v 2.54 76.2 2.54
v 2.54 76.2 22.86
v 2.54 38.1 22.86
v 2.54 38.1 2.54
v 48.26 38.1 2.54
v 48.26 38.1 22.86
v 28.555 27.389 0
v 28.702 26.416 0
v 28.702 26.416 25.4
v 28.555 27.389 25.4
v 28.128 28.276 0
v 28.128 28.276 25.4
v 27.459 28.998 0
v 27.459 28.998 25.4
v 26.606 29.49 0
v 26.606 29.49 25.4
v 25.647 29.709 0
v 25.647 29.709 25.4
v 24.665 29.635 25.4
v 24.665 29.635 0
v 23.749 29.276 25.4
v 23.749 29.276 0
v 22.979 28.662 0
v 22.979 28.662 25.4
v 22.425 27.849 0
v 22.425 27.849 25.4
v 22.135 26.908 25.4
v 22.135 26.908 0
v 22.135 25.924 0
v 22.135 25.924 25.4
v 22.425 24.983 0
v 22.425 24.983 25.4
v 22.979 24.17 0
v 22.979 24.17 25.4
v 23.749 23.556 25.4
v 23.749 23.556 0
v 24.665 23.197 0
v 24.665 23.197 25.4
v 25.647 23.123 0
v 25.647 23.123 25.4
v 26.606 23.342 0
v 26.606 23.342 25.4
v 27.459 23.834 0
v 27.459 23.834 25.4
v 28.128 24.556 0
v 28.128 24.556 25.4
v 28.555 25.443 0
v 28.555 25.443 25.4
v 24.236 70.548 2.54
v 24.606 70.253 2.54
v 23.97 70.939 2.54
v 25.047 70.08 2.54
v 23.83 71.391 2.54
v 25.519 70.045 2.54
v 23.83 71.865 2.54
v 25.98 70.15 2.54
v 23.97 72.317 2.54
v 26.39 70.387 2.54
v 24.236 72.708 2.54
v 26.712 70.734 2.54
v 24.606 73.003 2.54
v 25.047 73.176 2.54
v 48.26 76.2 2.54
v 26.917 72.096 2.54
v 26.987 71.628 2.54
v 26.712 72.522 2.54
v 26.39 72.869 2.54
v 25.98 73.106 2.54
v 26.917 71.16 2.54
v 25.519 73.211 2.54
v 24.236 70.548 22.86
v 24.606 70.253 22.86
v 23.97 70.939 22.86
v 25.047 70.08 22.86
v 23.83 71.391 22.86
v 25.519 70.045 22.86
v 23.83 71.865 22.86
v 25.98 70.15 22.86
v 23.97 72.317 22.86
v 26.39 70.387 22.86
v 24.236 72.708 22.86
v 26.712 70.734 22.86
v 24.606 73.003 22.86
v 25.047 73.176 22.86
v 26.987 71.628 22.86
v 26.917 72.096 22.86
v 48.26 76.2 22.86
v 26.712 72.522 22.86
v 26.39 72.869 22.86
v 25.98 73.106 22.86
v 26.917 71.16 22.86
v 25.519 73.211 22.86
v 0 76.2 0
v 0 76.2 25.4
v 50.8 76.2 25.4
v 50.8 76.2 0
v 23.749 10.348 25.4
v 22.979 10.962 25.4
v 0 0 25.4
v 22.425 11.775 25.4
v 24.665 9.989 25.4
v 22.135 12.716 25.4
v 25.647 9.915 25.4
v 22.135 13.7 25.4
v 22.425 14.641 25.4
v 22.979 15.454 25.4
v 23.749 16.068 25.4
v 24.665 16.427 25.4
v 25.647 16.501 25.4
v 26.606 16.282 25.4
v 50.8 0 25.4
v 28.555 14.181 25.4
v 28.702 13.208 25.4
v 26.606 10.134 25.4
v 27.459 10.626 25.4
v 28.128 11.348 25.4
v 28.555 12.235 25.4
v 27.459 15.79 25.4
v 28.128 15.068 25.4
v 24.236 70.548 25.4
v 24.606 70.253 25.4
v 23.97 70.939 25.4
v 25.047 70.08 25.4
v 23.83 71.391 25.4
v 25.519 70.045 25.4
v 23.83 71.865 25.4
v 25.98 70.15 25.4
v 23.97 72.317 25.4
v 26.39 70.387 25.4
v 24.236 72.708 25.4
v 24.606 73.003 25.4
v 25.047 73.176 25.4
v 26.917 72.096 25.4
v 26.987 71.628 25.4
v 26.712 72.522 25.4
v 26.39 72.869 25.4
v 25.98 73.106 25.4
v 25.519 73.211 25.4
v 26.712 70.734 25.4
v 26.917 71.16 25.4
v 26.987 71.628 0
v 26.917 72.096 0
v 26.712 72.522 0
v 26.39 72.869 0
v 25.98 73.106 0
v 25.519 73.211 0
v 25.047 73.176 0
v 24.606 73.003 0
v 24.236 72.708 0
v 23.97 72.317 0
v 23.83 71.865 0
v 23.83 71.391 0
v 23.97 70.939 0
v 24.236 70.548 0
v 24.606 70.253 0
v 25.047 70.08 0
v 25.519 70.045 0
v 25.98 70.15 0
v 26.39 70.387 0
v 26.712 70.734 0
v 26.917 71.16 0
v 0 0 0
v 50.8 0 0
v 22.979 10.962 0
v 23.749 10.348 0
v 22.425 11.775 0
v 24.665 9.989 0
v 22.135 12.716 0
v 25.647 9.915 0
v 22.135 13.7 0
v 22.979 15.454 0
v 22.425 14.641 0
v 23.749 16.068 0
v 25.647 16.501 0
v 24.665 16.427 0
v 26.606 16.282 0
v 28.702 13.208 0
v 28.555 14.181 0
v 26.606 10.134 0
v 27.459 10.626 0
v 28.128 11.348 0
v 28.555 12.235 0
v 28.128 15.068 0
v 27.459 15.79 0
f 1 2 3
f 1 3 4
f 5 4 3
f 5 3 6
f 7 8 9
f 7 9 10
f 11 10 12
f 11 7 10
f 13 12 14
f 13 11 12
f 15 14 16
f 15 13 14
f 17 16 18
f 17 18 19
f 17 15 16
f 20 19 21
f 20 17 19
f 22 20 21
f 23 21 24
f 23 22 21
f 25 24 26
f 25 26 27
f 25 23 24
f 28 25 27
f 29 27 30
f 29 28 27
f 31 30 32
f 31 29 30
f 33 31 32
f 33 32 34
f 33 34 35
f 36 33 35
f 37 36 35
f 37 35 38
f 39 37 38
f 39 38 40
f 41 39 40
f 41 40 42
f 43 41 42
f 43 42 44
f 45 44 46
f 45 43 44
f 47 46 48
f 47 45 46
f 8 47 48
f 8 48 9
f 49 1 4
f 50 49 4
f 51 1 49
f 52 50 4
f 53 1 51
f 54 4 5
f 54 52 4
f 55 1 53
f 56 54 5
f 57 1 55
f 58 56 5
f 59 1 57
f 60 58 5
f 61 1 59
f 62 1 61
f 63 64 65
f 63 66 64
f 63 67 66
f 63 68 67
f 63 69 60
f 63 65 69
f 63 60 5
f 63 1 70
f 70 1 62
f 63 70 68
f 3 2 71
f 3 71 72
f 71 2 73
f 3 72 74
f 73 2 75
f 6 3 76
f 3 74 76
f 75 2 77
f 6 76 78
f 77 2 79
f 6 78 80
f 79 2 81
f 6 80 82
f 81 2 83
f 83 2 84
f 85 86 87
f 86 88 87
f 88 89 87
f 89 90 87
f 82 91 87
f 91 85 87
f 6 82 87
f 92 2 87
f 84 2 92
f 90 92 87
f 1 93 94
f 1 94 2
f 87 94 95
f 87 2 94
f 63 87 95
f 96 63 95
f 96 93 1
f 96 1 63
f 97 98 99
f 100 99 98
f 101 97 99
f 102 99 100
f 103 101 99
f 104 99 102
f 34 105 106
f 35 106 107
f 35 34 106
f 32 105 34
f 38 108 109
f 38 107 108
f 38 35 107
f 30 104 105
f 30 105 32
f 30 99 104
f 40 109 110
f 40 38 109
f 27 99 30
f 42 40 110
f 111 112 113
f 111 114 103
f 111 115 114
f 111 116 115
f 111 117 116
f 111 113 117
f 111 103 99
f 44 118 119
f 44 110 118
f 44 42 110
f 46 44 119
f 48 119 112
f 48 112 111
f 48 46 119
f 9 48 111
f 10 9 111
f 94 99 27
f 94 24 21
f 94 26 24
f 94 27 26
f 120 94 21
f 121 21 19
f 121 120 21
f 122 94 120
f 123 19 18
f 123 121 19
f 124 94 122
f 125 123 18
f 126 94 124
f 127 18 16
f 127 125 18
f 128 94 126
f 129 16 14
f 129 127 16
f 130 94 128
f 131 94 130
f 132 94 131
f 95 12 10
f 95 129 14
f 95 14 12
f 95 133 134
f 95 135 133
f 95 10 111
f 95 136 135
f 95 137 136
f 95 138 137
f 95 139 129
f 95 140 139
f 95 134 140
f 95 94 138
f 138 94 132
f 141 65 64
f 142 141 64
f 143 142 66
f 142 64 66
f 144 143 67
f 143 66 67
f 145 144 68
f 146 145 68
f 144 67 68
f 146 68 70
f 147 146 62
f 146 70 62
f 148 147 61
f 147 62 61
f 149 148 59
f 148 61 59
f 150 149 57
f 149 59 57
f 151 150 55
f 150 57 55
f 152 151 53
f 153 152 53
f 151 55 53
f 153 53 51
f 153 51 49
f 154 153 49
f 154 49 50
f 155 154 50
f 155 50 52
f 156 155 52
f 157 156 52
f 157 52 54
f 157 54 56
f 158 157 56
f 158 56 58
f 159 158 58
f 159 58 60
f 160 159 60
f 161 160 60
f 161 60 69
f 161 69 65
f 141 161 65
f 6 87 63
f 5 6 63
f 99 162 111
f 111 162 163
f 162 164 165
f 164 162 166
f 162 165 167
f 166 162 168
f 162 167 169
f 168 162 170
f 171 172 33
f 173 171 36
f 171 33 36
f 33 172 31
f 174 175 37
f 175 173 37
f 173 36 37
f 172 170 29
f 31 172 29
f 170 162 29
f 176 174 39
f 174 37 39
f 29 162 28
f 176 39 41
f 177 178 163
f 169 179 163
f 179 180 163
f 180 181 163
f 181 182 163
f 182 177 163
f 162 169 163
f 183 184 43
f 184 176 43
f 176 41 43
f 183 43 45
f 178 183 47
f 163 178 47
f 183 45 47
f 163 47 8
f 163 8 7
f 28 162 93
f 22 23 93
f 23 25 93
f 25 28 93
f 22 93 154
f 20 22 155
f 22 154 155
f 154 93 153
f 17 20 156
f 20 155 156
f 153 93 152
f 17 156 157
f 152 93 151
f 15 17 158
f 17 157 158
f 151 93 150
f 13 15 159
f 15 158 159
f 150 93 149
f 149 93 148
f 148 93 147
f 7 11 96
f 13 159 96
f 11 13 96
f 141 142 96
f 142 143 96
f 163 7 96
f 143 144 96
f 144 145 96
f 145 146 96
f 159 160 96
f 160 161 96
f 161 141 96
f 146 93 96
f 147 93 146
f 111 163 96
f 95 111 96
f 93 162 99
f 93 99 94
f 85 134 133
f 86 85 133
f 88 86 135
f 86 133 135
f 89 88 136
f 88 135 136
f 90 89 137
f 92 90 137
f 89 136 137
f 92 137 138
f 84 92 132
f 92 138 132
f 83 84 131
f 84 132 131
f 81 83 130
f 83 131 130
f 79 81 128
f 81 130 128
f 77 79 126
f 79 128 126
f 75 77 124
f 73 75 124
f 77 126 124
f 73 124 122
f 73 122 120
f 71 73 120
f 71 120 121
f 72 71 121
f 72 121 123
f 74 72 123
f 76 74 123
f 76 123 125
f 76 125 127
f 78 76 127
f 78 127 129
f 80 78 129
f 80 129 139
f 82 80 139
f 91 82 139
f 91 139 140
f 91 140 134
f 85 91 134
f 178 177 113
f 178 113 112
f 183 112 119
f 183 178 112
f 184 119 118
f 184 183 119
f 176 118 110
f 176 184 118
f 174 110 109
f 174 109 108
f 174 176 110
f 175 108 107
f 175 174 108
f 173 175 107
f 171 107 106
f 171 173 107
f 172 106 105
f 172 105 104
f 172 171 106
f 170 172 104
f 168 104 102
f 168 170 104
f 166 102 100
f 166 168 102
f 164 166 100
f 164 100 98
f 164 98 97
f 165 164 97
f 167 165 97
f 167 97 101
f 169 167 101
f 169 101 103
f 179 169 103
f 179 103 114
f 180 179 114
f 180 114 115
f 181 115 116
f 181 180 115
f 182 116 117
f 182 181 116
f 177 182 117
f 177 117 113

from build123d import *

# Parameters (mm, degrees)
SKETCH1_W           = 50.8
SKETCH1_H           = 76.2
SKETCH1_R           = 3.302
BOSS_EXTRUDE1_DEPTH = 25.4
SKETCH2_W           = 45.72
SKETCH2_H           = 20.32
CUT_EXTRUDE1_DEPTH  = 38.1
SKETCH3_R           = 1.5875
CUT_EXTRUDE2_DEPTH  = 26.4


with BuildPart() as part:
    # Sketch1 → Boss-Extrude1 (new body)
    with BuildSketch(Plane.XY):
        with Locations((25.4, 38.1)):
            Rectangle(SKETCH1_W, SKETCH1_H)
        with Locations((25.4, 13.208)):
            Circle(SKETCH1_R, mode=Mode.SUBTRACT)
        with Locations((25.4, 26.416)):
            Circle(SKETCH1_R, mode=Mode.SUBTRACT)
    extrude(amount=BOSS_EXTRUDE1_DEPTH)

    # Sketch2 → Cut-Extrude1 (cut)
    with BuildSketch(Plane(origin=(0, 76.2, 0), x_dir=(1, 0, 0), z_dir=(0, 1, 0))):
        with Locations((25.4, -12.7)):
            Rectangle(SKETCH2_W, SKETCH2_H)
    extrude(amount=-CUT_EXTRUDE1_DEPTH, mode=Mode.SUBTRACT)

    # Sketch3 → Cut-Extrude2 (cut, through all)
    with BuildSketch(Plane.XY.offset(25.4)):
        with Locations((25.4, 71.628)):
            Circle(SKETCH3_R)
    extrude(amount=-CUT_EXTRUDE2_DEPTH, mode=Mode.SUBTRACT)


solid = part.part
